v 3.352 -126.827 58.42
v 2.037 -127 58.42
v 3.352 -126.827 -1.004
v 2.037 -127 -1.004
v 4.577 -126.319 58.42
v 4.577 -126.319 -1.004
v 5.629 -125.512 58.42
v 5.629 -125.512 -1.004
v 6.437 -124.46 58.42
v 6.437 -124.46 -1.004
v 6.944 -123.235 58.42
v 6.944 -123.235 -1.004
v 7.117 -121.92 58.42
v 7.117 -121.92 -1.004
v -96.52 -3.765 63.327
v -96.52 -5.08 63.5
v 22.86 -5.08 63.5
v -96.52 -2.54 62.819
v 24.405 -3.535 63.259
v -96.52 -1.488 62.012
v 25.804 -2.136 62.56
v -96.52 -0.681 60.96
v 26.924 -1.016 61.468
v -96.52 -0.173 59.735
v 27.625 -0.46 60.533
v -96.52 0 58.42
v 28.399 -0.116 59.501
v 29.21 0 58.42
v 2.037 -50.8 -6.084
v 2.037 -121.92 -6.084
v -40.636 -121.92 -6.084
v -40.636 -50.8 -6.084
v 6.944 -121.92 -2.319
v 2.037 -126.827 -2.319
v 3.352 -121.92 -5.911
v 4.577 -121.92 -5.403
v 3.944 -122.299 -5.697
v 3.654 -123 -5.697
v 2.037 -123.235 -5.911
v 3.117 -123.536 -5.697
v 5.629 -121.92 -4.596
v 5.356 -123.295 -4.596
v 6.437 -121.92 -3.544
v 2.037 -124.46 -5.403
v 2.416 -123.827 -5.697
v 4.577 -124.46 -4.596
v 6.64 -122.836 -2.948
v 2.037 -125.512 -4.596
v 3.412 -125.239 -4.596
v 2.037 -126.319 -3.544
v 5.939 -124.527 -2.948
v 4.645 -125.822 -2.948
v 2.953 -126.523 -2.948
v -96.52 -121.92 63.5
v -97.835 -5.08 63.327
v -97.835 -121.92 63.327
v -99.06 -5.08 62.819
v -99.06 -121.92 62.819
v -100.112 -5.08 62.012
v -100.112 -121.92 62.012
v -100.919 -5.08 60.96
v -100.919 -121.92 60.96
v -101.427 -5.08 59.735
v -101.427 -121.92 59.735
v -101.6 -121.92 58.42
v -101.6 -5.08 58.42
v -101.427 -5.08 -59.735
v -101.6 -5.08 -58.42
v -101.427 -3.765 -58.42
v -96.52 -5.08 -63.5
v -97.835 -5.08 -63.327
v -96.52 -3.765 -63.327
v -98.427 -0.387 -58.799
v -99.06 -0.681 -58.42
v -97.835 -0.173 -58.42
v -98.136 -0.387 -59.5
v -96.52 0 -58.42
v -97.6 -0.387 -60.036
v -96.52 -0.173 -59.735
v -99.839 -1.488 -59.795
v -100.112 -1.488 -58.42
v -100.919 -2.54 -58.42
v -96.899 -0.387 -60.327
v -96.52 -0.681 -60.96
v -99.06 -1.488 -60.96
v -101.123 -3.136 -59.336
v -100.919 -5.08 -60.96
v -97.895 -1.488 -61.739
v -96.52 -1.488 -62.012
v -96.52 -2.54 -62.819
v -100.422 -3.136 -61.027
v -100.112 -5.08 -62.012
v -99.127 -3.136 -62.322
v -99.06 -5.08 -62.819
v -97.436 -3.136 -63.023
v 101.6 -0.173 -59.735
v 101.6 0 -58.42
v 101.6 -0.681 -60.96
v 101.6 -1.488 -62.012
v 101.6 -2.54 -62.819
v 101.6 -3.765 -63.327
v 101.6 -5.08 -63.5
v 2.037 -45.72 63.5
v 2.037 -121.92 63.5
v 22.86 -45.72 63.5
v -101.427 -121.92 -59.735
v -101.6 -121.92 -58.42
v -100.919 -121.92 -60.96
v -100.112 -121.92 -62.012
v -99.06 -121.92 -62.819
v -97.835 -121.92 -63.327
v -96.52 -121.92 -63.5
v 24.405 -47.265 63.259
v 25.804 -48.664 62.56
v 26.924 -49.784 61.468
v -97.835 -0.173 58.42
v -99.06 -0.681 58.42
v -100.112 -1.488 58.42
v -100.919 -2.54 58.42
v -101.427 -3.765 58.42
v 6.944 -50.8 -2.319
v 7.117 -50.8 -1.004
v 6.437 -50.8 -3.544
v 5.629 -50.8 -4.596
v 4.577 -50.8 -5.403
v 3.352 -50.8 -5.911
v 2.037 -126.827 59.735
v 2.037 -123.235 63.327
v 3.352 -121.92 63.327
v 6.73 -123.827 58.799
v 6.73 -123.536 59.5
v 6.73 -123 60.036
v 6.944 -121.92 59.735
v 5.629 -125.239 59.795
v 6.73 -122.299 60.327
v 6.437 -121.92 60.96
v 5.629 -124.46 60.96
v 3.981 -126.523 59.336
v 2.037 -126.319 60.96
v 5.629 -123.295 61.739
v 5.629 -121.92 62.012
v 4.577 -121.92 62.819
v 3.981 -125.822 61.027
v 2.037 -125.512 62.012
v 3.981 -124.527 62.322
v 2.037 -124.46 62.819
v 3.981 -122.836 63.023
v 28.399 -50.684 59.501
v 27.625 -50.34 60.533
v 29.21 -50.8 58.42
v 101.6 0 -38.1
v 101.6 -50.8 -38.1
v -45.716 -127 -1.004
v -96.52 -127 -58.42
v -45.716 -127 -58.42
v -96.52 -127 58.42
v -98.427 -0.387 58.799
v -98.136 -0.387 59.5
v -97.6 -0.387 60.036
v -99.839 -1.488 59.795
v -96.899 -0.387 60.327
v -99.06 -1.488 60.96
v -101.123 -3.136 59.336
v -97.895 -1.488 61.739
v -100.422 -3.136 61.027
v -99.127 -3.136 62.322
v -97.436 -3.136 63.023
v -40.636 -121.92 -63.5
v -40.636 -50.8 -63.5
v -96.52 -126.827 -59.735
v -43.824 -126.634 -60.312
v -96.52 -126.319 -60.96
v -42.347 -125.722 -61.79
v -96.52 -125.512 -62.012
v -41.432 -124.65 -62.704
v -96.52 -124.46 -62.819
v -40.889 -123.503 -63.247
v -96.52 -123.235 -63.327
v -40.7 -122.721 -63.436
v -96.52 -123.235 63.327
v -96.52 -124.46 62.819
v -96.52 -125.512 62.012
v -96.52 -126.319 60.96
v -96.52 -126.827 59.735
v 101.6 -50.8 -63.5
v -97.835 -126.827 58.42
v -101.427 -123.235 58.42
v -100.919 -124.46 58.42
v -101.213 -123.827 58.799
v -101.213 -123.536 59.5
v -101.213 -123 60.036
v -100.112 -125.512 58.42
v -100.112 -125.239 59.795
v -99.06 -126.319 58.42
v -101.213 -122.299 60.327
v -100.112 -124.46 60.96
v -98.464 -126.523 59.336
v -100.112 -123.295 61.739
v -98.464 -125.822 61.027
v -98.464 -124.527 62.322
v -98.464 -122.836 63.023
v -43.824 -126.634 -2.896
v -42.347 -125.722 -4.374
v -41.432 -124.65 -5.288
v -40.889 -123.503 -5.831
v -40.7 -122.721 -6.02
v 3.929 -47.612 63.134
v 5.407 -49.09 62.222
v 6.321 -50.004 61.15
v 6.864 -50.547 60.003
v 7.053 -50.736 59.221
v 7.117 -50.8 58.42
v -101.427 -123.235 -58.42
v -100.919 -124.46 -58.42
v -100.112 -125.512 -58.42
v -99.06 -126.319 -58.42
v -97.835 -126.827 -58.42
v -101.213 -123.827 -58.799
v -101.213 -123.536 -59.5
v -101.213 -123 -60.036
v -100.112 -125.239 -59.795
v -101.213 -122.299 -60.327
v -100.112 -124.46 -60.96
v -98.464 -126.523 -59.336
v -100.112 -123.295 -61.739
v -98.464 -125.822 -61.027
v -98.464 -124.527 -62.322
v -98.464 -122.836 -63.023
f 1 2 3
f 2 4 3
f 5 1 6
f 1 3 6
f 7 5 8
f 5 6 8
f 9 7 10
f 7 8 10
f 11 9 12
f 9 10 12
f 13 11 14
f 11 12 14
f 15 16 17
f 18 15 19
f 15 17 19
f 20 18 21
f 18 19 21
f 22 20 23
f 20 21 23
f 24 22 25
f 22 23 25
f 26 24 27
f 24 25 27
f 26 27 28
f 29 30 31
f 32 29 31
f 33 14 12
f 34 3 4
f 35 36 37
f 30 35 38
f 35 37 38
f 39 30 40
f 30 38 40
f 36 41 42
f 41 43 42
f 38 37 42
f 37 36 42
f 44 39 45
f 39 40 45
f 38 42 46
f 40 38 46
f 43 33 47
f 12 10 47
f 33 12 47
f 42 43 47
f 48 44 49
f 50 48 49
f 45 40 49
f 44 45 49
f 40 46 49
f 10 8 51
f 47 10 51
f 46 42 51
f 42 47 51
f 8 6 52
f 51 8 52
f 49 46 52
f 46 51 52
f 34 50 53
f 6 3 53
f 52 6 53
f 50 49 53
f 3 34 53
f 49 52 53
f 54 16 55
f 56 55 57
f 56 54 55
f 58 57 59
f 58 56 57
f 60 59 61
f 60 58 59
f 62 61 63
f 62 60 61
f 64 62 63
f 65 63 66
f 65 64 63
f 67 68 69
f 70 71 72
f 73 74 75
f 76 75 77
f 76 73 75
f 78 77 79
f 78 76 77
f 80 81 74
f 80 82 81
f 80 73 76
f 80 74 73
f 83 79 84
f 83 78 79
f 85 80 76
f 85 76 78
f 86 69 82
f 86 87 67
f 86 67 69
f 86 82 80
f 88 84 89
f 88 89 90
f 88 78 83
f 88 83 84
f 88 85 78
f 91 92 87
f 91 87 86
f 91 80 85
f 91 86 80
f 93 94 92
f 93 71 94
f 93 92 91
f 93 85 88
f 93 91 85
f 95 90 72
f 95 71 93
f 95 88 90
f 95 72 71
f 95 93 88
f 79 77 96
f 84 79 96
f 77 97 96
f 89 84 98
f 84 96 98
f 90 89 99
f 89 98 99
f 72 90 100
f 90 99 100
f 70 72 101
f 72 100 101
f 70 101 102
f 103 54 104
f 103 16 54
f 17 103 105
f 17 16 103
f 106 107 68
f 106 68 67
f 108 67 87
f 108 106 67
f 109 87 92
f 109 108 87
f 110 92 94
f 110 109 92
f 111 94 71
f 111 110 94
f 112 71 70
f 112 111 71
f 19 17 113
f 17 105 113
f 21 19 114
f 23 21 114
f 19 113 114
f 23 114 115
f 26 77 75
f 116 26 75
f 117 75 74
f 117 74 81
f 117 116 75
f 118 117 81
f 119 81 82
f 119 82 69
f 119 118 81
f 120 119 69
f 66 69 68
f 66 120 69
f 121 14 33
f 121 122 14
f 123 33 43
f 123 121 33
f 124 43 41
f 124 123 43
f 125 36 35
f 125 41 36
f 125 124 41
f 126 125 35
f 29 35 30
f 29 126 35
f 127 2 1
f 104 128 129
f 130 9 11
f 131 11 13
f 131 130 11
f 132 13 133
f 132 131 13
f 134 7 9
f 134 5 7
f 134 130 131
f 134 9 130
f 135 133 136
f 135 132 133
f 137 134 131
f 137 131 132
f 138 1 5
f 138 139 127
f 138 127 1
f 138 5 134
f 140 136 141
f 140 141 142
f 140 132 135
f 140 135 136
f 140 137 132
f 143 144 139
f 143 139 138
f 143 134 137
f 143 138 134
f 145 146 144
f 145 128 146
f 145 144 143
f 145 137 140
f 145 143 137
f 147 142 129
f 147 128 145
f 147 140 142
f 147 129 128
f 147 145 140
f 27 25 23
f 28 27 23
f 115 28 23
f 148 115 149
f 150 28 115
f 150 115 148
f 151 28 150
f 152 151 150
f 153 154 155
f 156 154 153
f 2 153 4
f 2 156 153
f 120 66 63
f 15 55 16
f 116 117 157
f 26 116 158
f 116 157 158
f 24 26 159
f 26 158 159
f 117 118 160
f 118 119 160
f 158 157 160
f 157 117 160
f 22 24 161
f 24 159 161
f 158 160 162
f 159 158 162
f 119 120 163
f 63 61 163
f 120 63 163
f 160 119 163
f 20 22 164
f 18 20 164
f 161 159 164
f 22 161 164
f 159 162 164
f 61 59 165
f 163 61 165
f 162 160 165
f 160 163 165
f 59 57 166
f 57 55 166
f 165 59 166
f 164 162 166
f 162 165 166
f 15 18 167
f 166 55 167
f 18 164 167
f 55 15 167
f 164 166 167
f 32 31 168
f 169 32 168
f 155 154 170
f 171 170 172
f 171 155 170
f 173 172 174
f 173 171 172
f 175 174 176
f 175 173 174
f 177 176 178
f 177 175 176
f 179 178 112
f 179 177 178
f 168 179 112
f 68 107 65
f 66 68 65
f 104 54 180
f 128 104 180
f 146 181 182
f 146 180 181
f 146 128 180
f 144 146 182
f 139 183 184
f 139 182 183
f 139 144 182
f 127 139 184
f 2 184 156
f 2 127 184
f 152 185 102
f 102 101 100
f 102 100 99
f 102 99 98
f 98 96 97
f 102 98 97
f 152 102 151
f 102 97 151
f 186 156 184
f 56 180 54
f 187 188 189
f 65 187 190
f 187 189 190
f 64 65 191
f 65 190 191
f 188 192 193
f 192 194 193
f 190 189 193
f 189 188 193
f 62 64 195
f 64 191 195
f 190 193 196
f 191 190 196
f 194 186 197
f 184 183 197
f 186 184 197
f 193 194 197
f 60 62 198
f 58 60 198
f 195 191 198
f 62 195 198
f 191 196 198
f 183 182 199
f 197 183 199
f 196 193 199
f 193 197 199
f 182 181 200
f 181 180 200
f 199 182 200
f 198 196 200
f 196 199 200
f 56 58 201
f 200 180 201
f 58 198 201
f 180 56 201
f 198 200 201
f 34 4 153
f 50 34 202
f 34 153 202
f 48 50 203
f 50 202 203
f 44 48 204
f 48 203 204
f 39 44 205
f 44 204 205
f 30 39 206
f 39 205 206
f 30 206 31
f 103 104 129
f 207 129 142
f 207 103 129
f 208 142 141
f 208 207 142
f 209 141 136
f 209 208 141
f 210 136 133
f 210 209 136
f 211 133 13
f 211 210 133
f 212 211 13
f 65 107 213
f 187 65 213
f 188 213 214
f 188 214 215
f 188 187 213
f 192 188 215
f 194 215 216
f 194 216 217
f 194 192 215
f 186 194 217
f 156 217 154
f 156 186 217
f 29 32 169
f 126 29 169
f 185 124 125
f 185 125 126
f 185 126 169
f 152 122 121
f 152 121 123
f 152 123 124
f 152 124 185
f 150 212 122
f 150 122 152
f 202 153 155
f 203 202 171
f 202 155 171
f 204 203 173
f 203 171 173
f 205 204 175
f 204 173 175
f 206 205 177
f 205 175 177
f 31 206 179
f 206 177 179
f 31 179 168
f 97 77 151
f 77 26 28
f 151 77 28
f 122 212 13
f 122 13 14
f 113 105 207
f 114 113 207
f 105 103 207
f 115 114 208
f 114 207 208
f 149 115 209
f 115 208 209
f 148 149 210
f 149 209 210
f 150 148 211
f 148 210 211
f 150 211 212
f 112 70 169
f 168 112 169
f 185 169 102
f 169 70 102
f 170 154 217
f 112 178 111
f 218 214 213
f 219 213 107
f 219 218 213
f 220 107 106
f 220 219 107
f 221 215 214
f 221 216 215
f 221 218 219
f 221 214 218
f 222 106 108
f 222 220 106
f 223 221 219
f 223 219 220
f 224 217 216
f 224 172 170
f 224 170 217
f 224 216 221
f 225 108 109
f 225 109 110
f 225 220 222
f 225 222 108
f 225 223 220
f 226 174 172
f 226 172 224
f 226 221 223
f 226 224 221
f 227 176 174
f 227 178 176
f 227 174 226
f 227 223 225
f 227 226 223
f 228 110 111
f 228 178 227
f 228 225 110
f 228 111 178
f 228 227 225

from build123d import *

# Parameters (mm, degrees)
F0_W     = 203.2
F0_H     = 127
F1_DEPTH = 127
F3_DEPTH = 76.2
F4_SIZE2 = 101.6
F4_SIZE  = 76.2
F5_R     = 5.08


# Not quite as in the source:
# - the program builds the solid bodies; features that only make, move or delete a surface that nothing else refers to are left out


with BuildPart() as f1:
    # F0 (on Front) → F1 (new body)
    with BuildSketch(Plane.XZ):
        Rectangle(F0_W, F0_H)
    extrude(amount=F1_DEPTH)

    # F2 (on face) → F3 (cut)
    with BuildSketch(Plane.XZ.offset(127)):
        Polygon((-40.63635692, -6.0839741491), (-40.63635692, -63.5), (101.6, -63.5), (101.6, 63.5), (7.1171009913, 63.5), (7.1171009913, -6.0839741491), align=None)
    extrude(amount=-F3_DEPTH, mode=Mode.SUBTRACT)

    # F4
    f4_edges = [f1.edges().sort_by_distance(p)[0] for p in [
        (101.6, -25.4, 63.5),
    ]]
    f4_side = f1.faces().sort_by_distance((-21.033148, -53.671887, 63.5))[0]
    chamfer(f4_edges, length=F4_SIZE, length2=F4_SIZE2, reference=f4_side)

    # F5
    f5_edges = [f1.edges().sort_by_distance(p)[0] for p in [
        (-47.24145, -127, 63.5),
        (7.117101, -127, 28.708013),
        (7.117101, -88.9, -6.083974),
        (7.117101, -88.9, 63.5),
        (16.25855, -50.8, 63.5),
        (25.4, -25.4, 63.5),
        (-16.759628, -127, -6.083974),
        (-40.636357, -127, -34.791987),
        (-71.118178, -127, -63.5),
        (-101.6, -127, 0),
        (-101.6, -63.5, 63.5),
        (-101.6, -63.5, -63.5),
        (-101.6, 0, 0),
        (-38.1, 0, 63.5),
        (0, 0, -63.5),
    ]]
    fillet(f5_edges, radius=F5_R)


solid = f1.part
